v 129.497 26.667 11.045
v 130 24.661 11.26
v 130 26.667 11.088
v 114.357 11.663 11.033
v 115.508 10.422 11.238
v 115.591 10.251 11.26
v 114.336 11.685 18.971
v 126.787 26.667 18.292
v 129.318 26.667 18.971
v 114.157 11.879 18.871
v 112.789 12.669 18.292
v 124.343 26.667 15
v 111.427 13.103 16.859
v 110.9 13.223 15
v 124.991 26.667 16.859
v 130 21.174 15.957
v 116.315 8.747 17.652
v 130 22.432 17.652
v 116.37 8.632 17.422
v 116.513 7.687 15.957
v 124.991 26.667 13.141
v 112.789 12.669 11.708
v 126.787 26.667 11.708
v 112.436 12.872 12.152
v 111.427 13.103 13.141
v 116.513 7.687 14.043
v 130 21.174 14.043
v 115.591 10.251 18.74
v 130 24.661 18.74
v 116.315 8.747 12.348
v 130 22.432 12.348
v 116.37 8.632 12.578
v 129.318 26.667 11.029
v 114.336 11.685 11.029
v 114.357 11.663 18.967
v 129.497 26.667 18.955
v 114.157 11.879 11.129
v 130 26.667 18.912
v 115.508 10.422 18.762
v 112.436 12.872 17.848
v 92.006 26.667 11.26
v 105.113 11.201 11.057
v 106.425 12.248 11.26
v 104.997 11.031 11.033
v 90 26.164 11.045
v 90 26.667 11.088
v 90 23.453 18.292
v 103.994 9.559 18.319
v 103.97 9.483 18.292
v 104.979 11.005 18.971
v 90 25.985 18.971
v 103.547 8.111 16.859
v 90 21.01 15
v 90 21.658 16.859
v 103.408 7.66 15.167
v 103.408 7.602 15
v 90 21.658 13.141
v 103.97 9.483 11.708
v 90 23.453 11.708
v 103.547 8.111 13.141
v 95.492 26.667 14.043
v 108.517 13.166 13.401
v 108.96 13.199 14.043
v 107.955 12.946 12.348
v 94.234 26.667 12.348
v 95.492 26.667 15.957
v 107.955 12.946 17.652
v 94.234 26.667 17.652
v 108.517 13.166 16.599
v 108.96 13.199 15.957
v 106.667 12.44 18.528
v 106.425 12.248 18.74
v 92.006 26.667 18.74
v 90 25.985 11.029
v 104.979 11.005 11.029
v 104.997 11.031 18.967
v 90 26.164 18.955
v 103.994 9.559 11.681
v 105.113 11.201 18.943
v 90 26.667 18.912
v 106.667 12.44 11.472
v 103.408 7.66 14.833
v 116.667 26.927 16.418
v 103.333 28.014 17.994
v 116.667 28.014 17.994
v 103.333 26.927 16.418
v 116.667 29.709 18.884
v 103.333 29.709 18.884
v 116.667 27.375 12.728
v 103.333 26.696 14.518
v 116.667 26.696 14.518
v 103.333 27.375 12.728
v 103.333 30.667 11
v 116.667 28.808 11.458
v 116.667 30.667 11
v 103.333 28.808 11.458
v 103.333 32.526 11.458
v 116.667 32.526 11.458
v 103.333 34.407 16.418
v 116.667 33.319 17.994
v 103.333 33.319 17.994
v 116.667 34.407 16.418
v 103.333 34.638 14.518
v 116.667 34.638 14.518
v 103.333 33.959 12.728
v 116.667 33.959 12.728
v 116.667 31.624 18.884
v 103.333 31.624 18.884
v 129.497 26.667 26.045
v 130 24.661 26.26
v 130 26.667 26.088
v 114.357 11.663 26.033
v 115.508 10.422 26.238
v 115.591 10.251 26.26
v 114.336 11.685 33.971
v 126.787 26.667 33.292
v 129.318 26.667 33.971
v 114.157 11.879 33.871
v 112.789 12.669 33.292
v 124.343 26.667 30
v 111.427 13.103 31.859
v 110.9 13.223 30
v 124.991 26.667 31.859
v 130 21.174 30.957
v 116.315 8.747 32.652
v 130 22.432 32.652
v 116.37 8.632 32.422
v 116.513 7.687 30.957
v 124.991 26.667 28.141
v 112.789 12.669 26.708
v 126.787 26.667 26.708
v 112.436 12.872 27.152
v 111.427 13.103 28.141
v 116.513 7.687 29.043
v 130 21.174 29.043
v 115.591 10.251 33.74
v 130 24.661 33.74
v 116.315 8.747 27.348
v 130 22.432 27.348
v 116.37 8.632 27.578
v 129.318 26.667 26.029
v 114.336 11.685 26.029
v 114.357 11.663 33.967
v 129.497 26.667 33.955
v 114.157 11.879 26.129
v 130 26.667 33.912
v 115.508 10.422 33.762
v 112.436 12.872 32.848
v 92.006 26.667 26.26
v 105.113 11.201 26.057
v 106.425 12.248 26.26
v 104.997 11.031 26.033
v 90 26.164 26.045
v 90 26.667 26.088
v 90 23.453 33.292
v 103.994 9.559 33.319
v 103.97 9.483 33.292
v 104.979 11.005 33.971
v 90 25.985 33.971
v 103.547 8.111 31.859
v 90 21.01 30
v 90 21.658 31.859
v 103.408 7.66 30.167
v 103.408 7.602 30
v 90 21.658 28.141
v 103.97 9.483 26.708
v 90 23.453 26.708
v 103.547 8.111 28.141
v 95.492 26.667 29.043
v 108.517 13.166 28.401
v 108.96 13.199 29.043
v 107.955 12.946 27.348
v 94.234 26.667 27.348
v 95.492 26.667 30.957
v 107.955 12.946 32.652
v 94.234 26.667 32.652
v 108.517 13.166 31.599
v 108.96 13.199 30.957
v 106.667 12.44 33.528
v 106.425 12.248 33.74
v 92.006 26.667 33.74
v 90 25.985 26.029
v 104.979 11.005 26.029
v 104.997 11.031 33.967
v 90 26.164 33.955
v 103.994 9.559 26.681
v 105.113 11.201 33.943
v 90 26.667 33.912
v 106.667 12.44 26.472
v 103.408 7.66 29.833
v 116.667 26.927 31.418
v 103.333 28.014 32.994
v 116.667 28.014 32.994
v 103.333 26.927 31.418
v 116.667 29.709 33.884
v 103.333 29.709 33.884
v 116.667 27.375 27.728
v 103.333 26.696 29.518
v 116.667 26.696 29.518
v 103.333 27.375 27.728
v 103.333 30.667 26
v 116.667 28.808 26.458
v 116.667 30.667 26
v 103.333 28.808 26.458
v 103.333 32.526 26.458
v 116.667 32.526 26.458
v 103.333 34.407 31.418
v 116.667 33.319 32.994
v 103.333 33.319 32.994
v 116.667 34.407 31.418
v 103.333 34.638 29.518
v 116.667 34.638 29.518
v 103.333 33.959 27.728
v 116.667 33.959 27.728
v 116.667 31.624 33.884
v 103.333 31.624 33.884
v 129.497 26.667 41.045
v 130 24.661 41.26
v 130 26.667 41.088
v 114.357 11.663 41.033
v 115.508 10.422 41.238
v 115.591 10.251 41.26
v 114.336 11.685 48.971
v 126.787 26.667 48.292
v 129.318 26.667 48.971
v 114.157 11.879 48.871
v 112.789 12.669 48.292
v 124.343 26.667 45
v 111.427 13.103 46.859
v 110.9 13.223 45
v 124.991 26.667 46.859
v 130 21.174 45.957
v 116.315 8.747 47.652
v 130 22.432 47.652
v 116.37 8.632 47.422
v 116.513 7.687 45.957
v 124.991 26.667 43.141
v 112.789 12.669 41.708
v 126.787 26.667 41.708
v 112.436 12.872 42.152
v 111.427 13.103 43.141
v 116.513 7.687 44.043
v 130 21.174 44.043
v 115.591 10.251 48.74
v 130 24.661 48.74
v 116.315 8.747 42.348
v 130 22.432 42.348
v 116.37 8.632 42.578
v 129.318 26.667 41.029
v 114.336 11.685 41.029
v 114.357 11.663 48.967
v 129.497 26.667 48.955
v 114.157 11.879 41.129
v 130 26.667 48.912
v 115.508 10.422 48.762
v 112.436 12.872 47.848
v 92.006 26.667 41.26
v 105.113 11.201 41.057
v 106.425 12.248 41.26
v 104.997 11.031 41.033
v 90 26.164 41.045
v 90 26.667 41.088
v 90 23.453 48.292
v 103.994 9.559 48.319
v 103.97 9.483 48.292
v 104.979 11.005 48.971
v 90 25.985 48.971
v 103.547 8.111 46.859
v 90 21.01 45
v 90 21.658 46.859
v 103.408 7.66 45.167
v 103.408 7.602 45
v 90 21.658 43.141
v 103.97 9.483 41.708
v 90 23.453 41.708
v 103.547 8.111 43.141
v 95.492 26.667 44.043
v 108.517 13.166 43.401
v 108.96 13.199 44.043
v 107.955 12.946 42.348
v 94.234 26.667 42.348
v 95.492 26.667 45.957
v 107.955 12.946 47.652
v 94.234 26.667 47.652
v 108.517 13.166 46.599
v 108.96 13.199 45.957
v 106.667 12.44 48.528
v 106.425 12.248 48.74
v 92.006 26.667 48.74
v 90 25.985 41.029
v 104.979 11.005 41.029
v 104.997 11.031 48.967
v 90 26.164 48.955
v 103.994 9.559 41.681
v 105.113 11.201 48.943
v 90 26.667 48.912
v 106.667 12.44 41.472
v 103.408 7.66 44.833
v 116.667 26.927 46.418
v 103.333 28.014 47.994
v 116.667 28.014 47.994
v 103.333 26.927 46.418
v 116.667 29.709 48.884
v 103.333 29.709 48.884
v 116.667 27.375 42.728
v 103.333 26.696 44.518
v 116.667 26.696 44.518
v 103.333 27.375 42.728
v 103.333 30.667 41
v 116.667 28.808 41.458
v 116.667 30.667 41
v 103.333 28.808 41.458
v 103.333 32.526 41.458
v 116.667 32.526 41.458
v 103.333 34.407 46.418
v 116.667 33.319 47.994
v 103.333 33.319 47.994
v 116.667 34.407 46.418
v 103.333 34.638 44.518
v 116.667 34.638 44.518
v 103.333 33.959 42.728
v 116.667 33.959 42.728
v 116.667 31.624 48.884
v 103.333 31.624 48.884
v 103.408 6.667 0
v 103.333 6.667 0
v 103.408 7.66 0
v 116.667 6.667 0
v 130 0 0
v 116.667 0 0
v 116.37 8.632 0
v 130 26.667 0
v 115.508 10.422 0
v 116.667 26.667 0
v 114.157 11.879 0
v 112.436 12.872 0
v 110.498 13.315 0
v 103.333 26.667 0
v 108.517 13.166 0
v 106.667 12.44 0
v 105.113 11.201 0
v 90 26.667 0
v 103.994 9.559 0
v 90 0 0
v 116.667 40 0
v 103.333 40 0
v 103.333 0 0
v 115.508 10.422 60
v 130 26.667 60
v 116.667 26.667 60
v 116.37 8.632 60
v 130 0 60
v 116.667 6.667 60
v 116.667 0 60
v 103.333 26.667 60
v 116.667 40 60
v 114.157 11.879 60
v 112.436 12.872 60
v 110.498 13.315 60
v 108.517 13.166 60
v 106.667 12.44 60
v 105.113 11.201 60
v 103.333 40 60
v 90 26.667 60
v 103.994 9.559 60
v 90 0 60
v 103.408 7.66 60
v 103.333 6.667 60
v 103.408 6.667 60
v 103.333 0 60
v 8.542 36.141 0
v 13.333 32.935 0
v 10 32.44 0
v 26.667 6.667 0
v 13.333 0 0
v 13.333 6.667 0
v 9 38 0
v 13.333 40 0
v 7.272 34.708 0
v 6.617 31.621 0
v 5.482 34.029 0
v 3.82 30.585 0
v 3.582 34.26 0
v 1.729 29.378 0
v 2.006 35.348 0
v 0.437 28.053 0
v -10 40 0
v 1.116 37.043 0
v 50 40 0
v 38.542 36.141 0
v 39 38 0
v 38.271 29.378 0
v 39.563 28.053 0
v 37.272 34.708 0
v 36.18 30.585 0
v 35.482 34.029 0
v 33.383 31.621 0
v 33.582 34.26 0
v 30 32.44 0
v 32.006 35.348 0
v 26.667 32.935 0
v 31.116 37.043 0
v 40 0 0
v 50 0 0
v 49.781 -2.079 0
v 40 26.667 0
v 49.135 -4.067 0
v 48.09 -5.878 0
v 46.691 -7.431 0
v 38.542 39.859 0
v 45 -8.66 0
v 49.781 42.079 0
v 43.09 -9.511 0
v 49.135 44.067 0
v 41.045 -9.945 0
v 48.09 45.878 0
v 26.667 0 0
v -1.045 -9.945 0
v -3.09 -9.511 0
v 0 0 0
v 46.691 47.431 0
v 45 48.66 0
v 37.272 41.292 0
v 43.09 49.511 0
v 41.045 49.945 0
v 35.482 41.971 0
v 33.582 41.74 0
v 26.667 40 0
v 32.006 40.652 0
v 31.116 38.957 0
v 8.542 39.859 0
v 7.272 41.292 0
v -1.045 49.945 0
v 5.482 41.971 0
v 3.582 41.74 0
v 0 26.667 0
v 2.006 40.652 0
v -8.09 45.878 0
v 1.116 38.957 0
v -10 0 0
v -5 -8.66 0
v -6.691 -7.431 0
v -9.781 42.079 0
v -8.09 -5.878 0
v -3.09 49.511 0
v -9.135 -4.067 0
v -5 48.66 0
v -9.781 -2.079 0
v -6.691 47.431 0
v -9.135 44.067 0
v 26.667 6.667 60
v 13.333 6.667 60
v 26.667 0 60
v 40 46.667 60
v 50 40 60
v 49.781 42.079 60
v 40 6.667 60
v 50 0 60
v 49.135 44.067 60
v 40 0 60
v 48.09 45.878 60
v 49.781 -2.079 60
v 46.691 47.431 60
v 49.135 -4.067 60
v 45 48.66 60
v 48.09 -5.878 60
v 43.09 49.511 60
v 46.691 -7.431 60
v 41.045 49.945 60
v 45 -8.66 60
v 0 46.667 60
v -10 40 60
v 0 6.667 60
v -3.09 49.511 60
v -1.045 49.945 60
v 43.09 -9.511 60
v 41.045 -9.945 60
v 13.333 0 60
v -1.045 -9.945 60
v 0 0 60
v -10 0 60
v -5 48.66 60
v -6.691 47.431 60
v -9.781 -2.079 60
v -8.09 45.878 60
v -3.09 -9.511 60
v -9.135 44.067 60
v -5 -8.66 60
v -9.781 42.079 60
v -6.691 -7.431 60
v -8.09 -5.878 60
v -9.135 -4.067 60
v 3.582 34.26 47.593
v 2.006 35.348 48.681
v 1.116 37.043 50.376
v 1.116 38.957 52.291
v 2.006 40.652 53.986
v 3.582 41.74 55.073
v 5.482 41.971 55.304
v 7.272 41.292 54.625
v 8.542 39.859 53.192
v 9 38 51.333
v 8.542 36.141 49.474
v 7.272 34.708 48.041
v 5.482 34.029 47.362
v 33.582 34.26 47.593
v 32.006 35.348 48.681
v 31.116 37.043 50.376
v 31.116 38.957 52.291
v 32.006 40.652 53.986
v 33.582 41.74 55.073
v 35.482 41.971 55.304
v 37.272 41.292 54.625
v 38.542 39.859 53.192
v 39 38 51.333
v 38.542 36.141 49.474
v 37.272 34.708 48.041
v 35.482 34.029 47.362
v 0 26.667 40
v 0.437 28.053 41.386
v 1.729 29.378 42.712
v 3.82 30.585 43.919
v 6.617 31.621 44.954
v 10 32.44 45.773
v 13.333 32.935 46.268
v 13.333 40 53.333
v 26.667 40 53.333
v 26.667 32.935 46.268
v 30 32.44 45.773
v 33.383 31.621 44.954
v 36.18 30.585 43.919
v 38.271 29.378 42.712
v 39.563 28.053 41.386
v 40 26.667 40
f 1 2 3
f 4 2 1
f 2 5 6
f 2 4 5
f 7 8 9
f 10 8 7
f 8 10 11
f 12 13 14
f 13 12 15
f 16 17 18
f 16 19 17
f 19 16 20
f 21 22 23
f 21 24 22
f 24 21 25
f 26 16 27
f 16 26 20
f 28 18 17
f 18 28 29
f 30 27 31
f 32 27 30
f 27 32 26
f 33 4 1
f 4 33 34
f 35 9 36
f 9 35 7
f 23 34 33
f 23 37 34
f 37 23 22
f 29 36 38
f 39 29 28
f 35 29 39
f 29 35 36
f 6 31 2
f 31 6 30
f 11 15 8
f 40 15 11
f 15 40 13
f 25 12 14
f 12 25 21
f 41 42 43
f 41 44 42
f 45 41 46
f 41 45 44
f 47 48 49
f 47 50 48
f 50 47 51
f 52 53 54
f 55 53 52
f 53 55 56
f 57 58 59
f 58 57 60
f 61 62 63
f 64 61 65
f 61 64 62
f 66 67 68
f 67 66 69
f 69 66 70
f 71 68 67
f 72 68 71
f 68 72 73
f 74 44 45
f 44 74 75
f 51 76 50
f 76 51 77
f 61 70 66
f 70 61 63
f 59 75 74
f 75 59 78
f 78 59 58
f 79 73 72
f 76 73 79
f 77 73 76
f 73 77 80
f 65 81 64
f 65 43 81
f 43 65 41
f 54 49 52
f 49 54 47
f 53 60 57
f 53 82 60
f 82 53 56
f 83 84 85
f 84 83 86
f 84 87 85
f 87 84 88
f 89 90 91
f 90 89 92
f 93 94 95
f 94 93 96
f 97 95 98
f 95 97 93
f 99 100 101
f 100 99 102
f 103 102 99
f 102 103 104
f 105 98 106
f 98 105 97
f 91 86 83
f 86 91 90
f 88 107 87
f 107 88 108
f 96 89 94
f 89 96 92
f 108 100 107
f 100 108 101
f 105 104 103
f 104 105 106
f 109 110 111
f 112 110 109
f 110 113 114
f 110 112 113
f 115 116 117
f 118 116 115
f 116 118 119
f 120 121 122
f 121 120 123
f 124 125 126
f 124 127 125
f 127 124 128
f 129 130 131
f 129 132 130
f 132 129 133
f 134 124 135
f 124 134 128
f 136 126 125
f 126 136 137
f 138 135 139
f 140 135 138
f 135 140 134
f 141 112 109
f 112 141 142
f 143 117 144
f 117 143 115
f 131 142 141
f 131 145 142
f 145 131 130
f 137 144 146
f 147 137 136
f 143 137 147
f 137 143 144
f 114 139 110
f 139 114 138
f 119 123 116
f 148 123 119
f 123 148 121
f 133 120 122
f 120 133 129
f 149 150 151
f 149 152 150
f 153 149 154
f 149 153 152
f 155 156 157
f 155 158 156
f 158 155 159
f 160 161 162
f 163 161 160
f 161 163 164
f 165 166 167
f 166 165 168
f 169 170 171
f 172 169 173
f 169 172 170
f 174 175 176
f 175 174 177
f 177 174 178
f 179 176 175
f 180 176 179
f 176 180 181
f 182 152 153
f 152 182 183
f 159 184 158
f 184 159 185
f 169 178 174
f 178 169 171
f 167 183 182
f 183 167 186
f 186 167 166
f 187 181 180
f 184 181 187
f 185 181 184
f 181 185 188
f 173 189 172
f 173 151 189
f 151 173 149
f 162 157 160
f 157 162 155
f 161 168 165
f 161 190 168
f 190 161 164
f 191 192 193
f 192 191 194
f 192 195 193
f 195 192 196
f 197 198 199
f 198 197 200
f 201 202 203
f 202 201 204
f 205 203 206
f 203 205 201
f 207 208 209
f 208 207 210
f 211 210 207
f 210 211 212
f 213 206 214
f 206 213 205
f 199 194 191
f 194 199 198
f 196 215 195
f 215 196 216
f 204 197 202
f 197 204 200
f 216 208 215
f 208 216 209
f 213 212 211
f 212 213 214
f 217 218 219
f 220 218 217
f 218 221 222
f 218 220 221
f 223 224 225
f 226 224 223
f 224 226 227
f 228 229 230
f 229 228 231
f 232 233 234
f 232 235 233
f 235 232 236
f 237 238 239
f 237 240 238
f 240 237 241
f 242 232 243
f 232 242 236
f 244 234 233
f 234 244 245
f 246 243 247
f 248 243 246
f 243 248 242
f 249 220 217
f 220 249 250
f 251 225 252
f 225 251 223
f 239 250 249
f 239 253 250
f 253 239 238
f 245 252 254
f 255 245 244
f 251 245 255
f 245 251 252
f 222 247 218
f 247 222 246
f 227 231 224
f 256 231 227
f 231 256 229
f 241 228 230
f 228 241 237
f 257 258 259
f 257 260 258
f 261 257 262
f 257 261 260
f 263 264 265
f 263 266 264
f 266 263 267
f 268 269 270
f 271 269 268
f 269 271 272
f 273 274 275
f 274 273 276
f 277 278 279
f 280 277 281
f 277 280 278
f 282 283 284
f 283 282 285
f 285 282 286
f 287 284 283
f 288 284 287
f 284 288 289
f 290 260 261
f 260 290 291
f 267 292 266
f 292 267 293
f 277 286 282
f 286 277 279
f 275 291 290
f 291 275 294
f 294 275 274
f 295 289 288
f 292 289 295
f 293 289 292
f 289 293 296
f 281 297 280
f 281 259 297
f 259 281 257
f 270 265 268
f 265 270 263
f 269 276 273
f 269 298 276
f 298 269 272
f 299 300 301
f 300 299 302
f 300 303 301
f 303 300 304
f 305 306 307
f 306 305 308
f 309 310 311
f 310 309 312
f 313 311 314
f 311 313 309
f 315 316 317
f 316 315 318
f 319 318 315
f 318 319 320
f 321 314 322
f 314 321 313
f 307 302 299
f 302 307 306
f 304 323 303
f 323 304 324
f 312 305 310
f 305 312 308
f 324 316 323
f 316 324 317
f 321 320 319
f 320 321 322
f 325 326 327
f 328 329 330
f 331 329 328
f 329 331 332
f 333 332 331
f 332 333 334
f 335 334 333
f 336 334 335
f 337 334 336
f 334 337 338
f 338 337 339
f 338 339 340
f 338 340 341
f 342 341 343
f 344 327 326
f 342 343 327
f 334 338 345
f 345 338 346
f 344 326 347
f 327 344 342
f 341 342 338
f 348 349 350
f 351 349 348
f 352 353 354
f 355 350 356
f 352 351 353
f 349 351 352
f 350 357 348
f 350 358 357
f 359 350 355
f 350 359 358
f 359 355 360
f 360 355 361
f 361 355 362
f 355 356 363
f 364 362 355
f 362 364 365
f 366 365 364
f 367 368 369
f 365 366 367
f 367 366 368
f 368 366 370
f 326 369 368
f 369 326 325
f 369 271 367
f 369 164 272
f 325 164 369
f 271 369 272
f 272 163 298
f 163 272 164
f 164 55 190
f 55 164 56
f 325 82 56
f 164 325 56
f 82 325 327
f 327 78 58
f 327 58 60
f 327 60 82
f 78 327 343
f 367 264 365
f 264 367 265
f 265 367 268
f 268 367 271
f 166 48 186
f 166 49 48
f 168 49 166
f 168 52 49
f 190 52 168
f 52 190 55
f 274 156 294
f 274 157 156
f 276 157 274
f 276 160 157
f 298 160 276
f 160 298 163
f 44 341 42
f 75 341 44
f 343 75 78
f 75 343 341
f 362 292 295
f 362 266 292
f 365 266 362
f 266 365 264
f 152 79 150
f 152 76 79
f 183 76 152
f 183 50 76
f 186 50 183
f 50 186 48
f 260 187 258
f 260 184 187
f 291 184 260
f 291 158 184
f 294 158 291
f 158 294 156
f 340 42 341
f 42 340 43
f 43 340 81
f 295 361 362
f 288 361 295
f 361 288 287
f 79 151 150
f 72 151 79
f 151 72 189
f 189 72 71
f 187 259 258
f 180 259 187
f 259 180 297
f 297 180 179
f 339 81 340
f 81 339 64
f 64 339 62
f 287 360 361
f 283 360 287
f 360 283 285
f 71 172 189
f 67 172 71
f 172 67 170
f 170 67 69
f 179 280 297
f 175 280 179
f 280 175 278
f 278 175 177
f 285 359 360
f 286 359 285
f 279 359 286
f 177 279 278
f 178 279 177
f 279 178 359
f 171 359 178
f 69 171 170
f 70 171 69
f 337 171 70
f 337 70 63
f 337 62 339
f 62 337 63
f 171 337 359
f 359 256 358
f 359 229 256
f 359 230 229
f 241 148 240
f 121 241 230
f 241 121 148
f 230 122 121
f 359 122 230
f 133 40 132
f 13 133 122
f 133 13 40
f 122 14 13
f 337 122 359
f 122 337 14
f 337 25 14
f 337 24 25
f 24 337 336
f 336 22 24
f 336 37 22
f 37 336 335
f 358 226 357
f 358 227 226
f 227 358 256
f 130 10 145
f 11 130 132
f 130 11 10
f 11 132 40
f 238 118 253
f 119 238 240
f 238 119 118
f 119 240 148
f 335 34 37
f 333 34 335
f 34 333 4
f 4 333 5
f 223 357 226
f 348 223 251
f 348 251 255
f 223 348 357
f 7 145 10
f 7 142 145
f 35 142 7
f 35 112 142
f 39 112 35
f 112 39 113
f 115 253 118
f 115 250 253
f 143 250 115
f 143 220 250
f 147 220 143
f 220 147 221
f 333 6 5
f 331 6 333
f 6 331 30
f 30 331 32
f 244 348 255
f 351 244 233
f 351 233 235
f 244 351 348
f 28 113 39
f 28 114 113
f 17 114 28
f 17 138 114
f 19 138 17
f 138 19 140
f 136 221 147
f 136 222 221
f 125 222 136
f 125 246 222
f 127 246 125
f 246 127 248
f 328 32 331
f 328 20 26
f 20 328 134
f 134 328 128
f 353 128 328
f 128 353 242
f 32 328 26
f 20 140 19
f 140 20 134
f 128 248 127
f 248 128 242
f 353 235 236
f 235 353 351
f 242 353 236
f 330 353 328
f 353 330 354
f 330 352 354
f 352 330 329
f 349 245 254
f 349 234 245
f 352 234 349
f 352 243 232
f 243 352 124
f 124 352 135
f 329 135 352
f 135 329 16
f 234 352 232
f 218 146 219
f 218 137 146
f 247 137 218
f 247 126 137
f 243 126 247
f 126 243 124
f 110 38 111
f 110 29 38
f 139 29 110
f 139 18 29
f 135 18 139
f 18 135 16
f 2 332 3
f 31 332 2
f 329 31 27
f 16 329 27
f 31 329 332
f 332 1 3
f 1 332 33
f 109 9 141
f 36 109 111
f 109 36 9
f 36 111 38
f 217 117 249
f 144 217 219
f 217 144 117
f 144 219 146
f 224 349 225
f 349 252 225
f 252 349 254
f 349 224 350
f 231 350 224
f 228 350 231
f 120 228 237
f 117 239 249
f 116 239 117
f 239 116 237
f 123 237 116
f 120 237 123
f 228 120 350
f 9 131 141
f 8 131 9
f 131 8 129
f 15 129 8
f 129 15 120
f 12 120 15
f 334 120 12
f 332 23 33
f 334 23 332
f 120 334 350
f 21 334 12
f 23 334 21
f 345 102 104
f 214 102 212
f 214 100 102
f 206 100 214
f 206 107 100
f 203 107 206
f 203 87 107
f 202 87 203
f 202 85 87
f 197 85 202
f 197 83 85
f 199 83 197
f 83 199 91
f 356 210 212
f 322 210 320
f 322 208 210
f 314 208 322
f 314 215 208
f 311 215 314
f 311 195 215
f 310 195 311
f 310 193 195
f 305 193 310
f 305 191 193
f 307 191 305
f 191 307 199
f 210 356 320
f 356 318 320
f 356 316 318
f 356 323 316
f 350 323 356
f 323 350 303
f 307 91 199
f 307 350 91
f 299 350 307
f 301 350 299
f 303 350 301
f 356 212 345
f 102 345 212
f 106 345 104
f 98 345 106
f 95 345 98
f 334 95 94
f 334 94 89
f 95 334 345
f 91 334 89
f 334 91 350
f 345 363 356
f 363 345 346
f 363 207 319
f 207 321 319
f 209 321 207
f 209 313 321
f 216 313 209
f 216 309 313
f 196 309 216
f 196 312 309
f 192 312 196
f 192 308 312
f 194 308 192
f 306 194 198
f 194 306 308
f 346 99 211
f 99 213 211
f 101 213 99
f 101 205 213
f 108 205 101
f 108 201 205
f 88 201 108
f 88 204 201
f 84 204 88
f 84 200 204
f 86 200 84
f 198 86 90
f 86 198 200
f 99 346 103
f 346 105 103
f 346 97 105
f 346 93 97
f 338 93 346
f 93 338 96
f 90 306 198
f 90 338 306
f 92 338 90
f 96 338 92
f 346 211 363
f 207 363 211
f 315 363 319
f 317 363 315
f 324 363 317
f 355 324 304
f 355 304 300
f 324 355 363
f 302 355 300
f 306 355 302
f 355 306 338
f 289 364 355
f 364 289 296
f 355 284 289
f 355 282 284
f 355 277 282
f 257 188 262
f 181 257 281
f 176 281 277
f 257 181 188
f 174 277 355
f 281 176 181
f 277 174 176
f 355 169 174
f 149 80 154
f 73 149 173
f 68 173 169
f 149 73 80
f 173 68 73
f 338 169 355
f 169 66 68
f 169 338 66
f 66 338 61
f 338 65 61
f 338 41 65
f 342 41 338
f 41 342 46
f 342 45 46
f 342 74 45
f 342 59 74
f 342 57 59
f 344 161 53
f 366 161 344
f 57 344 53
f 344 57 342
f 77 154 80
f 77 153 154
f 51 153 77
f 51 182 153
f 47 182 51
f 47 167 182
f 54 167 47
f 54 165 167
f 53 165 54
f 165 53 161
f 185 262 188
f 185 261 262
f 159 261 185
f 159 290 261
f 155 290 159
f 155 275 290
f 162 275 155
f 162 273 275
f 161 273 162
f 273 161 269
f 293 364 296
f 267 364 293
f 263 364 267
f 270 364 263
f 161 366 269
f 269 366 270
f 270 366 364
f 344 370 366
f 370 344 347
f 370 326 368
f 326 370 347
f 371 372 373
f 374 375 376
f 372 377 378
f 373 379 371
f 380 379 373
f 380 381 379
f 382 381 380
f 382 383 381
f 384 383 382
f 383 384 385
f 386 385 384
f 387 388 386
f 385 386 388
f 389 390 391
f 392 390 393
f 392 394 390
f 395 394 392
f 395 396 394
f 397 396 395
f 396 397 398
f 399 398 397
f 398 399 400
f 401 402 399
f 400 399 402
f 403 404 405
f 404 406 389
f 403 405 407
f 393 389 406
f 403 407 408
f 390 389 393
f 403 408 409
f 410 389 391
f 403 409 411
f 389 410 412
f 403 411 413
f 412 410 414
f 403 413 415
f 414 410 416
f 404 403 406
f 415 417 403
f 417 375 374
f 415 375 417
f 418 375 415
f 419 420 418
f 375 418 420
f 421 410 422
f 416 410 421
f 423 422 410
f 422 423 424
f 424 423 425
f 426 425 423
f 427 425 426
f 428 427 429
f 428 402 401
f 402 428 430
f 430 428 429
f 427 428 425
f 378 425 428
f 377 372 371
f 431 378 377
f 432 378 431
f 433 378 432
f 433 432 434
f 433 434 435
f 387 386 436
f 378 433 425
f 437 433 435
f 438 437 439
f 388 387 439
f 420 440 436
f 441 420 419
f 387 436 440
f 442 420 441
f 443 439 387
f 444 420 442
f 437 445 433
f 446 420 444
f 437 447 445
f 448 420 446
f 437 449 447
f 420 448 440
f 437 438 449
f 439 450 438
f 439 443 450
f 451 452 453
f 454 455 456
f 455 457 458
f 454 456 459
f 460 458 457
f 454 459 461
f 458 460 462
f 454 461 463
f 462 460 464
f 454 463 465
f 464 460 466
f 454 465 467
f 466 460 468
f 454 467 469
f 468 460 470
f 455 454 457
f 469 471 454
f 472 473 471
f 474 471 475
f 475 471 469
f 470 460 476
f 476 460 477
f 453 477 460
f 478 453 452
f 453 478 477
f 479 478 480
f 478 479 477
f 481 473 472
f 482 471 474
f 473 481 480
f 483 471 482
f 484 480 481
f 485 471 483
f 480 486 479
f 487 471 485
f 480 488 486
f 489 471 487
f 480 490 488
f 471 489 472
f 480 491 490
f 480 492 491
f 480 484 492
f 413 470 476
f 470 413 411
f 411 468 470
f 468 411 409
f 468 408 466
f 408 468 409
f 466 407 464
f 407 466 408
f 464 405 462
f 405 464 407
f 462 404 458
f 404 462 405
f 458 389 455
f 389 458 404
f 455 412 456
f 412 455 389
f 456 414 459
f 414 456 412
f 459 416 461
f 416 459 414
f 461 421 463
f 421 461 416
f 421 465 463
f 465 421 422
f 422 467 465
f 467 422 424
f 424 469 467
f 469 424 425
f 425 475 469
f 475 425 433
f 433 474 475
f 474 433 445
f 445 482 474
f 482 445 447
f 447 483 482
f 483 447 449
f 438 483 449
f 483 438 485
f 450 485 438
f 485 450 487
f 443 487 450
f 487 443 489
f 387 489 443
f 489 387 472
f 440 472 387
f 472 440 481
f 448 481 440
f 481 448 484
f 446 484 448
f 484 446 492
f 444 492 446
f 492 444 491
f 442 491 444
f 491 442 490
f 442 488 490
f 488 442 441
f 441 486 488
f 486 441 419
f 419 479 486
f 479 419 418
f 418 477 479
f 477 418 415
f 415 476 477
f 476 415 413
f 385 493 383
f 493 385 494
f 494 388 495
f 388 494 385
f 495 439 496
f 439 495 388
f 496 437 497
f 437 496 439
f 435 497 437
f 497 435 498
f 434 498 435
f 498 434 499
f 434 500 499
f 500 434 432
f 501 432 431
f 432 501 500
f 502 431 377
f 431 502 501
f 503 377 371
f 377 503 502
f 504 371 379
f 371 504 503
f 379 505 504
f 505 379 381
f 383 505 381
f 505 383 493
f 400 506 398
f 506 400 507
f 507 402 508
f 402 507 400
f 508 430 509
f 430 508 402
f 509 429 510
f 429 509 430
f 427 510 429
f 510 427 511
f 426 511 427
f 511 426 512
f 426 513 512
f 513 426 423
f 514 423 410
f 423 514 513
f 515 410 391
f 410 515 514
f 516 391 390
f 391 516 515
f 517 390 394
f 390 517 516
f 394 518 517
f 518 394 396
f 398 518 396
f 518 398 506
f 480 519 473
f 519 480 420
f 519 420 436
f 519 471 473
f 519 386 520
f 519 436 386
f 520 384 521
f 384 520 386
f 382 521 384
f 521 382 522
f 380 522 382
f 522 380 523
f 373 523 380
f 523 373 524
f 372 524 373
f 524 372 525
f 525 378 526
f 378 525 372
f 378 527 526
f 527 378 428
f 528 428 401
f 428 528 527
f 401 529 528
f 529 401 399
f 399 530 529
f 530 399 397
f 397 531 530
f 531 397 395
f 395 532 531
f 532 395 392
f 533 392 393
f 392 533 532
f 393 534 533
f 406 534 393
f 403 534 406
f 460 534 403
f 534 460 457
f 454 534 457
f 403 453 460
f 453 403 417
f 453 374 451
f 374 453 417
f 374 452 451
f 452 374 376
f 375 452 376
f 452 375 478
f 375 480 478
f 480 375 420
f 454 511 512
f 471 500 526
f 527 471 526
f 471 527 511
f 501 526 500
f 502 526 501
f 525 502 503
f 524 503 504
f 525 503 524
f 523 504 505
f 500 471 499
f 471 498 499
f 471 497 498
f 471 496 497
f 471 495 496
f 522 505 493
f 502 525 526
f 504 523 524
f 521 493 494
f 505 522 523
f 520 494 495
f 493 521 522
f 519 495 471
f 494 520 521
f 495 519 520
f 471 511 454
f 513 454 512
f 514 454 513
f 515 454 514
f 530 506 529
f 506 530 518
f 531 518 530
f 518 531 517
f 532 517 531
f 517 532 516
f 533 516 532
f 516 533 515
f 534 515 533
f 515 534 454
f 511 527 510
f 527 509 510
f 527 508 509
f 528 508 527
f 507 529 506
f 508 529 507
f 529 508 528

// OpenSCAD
//
//  Copyright (C) 26-04-2013 Jasper den Ouden.
//
//  This is free software: you can redistribute it and/or modify
//  it under the terms of the GNU General Public License as published
//  by the Free Software Foundation, either version 3 of the License, or
//  (at your option) any later version.
//

t = 10;
w= 40; h= w; l =60;
f=1.05;

sr= 4;
inf = 3*(l+w+h);

module slide_hole_profile()
{
    difference()
    {   union()
        {   square([w,2*h/3]);
            translate([w/2,h/2]) square([w/3,h],center=true);
        }
        translate([w/2,0]) square([w/3,h/3],center=true);
    }
}

module body_profile()
{   minkowski()
    {   square([w,h]);
        circle(t);
    }
}
module body()
{
    difference()
    {   linear_extrude( height=l ) difference()
        {   body_profile();
            slide_hole_profile();
            translate([w/2,2*h/3]) scale([1,1/3]) circle(w/2);
            translate([w/8,h-sr/2]) circle(sr);
            translate([7*w/8,h-sr/2]) circle(sr);
        }
        translate([0,h-w/3,l-w/2]) rotate([45,0,0]) cube([w,w,w]);
    }
}


module slide_cut()
{   translate([w/2,h/6]) 
    {   rotate(135) rotate([90,0,0]) cylinder(r=sr,h=inf);
        rotate(225) rotate([90,0,0]) cylinder(r=sr,h=inf);
    }
    translate([0,2*h/3+sr]) rotate([0,90,0]) cylinder(r=sr,h=inf);
}
module slide()
{   
    difference()
    {   linear_extrude(height=l) difference()
        {   slide_hole_profile();
            translate([w/2,h/6]) circle(w/6);
        }
        translate([0,0,l/4]) slide_cut();
        translate([0,0,l/2]) slide_cut();
        translate([0,0,3*l/4]) slide_cut();
    }
}
translate([2*w+t,0]) slide();

body();
